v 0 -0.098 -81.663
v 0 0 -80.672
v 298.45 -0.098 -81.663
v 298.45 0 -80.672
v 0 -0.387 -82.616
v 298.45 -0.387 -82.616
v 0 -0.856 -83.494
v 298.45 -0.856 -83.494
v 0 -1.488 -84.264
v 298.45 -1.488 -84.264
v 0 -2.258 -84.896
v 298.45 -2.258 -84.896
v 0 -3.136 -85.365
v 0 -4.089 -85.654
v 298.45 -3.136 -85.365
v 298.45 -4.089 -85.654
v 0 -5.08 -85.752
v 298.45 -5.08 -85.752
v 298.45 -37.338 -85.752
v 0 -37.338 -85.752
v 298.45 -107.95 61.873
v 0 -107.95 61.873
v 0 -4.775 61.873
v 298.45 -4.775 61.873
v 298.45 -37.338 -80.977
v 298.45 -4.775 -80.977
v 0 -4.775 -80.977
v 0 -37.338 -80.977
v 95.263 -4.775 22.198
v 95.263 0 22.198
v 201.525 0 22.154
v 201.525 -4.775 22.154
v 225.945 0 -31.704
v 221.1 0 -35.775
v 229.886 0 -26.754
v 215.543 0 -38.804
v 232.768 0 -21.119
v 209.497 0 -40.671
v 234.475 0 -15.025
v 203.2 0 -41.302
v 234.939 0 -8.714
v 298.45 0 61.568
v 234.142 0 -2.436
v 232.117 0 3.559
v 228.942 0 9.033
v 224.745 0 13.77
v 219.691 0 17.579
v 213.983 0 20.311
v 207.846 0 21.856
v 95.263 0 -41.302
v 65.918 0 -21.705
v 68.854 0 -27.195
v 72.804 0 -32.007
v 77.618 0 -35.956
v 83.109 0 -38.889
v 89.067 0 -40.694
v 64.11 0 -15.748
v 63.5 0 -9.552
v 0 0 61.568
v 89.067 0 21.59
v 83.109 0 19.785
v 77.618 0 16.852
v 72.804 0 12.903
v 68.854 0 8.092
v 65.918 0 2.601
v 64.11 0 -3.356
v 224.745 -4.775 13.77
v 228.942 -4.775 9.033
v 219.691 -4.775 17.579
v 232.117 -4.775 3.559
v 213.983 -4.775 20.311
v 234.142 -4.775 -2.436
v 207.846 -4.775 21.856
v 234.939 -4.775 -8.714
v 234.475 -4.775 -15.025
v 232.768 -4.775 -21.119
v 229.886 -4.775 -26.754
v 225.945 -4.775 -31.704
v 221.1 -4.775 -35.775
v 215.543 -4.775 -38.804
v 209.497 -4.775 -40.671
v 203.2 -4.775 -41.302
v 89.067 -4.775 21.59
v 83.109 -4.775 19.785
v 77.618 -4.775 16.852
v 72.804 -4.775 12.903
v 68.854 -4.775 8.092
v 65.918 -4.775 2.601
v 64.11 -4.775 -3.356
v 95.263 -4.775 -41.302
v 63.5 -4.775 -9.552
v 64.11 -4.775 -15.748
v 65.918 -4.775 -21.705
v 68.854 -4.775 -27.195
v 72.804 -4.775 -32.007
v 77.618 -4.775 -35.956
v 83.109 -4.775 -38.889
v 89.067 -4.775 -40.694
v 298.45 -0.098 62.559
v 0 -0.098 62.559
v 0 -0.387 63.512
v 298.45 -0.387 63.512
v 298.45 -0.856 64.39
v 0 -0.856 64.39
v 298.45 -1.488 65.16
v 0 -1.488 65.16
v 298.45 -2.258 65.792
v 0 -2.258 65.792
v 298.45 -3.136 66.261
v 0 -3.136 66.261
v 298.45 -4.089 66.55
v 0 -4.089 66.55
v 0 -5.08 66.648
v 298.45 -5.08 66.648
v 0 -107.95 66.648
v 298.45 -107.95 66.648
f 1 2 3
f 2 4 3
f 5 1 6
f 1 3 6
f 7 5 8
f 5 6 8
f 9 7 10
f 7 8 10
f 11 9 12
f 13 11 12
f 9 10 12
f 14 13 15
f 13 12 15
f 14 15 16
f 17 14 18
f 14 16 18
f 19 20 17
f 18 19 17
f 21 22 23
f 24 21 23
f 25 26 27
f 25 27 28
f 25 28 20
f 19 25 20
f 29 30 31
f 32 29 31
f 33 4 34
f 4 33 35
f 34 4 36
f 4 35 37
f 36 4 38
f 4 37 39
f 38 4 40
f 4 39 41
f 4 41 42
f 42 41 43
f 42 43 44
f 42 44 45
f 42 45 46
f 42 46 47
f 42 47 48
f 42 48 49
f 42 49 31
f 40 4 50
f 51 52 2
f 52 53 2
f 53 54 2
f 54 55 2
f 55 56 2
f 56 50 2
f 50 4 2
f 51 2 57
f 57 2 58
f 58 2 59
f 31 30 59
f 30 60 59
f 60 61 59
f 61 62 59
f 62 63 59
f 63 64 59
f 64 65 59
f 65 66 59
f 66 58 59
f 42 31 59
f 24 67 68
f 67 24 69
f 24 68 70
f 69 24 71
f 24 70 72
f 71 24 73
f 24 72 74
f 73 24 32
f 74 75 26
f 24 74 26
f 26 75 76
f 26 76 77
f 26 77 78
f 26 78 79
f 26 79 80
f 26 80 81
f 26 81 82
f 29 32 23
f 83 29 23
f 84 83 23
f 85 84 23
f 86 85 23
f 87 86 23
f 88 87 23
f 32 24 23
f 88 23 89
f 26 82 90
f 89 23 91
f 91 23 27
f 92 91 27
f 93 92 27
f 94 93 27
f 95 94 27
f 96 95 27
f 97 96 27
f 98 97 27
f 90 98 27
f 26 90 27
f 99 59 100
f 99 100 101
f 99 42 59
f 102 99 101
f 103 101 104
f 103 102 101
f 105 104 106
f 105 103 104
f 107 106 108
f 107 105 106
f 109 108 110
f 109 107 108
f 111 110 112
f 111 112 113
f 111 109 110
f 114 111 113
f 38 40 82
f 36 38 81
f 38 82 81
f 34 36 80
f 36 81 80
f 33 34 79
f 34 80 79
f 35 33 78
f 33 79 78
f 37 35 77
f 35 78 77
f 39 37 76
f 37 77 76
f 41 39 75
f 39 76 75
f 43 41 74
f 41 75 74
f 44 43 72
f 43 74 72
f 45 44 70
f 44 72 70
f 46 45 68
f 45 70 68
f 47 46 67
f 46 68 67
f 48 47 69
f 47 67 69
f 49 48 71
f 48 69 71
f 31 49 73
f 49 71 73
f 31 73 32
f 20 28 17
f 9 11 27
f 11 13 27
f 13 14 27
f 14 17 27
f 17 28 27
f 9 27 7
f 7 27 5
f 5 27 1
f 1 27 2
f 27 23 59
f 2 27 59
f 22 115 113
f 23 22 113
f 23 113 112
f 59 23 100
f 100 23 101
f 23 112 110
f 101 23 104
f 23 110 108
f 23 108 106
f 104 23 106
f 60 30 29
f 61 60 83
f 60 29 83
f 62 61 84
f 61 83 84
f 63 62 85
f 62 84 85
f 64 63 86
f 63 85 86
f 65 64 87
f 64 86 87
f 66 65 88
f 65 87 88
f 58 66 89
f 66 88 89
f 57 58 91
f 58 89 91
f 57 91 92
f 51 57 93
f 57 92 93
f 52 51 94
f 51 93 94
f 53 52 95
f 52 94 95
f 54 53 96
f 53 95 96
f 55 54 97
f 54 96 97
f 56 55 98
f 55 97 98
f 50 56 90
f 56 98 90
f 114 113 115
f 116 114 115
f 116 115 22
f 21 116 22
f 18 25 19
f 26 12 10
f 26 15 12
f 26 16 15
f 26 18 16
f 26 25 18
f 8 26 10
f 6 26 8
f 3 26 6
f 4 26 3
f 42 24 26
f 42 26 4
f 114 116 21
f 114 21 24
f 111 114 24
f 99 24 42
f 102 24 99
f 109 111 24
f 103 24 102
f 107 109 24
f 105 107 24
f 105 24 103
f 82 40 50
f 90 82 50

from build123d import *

# Parameters (mm, degrees)
F1_DEPTH = 298.45
F2_R     = 5.08
F4_D     = 63.5
F6_DEPTH = 25.4


with BuildPart() as f1:
    # F0 (on Right) → F1 (new body)
    with BuildSketch(Plane.YZ):
        Polygon((0, -85.7519404639), (0, 66.6480595361), (-107.95, 66.6480595361), (-107.95, 61.8728595361), (-4.7752, 61.8728595361), (-4.7752, -80.9767404639), (-37.338, -80.9767404639), (-37.338, -85.7519404639), align=None)
    extrude(amount=F1_DEPTH)

    # F2
    f2_edges = [f1.edges().sort_by_distance(p)[0] for p in [
        (149.225, 0, 66.64806),
        (149.225, 0, -85.75194),
    ]]
    fillet(f2_edges, radius=F2_R)

    # F4 (through all)
    with Locations(Plane(origin=(0, 0, 0), x_dir=(-1, 0, 0), z_dir=(0, 1, 0))):
        with Locations((-203.2, -9.5519404639), (-95.25, -9.5519404639)):
            Hole(F4_D / 2)

    # F5 (on face) → F6 (cut)
    with BuildSketch(Plane(origin=(0, 0, 0), x_dir=(-1, 0, 0), z_dir=(0, 1, 0))):
        with BuildLine():
            Line((-95.2632086497, 22.1980567886), (-201.5250755989, 22.1538496737))
            ThreePointArc((-201.5250755989, 22.1538496737), (-180.1647948812, 12.2985017543), (-171.45, -9.5519404639))
            ThreePointArc((-171.45, -9.5519404639), (-180.7493594116, -32.0025804808), (-203.1999991918, -41.3019404639))
            Line((-203.1999991918, -41.3019404639), (-95.2632086497, -41.3019377164))
            ThreePointArc((-95.2632086497, -41.3019377164), (-127, -9.5519404639), (-95.2632086497, 22.1980567886))
        make_face()
    extrude(amount=-F6_DEPTH, mode=Mode.SUBTRACT)


solid = f1.part
